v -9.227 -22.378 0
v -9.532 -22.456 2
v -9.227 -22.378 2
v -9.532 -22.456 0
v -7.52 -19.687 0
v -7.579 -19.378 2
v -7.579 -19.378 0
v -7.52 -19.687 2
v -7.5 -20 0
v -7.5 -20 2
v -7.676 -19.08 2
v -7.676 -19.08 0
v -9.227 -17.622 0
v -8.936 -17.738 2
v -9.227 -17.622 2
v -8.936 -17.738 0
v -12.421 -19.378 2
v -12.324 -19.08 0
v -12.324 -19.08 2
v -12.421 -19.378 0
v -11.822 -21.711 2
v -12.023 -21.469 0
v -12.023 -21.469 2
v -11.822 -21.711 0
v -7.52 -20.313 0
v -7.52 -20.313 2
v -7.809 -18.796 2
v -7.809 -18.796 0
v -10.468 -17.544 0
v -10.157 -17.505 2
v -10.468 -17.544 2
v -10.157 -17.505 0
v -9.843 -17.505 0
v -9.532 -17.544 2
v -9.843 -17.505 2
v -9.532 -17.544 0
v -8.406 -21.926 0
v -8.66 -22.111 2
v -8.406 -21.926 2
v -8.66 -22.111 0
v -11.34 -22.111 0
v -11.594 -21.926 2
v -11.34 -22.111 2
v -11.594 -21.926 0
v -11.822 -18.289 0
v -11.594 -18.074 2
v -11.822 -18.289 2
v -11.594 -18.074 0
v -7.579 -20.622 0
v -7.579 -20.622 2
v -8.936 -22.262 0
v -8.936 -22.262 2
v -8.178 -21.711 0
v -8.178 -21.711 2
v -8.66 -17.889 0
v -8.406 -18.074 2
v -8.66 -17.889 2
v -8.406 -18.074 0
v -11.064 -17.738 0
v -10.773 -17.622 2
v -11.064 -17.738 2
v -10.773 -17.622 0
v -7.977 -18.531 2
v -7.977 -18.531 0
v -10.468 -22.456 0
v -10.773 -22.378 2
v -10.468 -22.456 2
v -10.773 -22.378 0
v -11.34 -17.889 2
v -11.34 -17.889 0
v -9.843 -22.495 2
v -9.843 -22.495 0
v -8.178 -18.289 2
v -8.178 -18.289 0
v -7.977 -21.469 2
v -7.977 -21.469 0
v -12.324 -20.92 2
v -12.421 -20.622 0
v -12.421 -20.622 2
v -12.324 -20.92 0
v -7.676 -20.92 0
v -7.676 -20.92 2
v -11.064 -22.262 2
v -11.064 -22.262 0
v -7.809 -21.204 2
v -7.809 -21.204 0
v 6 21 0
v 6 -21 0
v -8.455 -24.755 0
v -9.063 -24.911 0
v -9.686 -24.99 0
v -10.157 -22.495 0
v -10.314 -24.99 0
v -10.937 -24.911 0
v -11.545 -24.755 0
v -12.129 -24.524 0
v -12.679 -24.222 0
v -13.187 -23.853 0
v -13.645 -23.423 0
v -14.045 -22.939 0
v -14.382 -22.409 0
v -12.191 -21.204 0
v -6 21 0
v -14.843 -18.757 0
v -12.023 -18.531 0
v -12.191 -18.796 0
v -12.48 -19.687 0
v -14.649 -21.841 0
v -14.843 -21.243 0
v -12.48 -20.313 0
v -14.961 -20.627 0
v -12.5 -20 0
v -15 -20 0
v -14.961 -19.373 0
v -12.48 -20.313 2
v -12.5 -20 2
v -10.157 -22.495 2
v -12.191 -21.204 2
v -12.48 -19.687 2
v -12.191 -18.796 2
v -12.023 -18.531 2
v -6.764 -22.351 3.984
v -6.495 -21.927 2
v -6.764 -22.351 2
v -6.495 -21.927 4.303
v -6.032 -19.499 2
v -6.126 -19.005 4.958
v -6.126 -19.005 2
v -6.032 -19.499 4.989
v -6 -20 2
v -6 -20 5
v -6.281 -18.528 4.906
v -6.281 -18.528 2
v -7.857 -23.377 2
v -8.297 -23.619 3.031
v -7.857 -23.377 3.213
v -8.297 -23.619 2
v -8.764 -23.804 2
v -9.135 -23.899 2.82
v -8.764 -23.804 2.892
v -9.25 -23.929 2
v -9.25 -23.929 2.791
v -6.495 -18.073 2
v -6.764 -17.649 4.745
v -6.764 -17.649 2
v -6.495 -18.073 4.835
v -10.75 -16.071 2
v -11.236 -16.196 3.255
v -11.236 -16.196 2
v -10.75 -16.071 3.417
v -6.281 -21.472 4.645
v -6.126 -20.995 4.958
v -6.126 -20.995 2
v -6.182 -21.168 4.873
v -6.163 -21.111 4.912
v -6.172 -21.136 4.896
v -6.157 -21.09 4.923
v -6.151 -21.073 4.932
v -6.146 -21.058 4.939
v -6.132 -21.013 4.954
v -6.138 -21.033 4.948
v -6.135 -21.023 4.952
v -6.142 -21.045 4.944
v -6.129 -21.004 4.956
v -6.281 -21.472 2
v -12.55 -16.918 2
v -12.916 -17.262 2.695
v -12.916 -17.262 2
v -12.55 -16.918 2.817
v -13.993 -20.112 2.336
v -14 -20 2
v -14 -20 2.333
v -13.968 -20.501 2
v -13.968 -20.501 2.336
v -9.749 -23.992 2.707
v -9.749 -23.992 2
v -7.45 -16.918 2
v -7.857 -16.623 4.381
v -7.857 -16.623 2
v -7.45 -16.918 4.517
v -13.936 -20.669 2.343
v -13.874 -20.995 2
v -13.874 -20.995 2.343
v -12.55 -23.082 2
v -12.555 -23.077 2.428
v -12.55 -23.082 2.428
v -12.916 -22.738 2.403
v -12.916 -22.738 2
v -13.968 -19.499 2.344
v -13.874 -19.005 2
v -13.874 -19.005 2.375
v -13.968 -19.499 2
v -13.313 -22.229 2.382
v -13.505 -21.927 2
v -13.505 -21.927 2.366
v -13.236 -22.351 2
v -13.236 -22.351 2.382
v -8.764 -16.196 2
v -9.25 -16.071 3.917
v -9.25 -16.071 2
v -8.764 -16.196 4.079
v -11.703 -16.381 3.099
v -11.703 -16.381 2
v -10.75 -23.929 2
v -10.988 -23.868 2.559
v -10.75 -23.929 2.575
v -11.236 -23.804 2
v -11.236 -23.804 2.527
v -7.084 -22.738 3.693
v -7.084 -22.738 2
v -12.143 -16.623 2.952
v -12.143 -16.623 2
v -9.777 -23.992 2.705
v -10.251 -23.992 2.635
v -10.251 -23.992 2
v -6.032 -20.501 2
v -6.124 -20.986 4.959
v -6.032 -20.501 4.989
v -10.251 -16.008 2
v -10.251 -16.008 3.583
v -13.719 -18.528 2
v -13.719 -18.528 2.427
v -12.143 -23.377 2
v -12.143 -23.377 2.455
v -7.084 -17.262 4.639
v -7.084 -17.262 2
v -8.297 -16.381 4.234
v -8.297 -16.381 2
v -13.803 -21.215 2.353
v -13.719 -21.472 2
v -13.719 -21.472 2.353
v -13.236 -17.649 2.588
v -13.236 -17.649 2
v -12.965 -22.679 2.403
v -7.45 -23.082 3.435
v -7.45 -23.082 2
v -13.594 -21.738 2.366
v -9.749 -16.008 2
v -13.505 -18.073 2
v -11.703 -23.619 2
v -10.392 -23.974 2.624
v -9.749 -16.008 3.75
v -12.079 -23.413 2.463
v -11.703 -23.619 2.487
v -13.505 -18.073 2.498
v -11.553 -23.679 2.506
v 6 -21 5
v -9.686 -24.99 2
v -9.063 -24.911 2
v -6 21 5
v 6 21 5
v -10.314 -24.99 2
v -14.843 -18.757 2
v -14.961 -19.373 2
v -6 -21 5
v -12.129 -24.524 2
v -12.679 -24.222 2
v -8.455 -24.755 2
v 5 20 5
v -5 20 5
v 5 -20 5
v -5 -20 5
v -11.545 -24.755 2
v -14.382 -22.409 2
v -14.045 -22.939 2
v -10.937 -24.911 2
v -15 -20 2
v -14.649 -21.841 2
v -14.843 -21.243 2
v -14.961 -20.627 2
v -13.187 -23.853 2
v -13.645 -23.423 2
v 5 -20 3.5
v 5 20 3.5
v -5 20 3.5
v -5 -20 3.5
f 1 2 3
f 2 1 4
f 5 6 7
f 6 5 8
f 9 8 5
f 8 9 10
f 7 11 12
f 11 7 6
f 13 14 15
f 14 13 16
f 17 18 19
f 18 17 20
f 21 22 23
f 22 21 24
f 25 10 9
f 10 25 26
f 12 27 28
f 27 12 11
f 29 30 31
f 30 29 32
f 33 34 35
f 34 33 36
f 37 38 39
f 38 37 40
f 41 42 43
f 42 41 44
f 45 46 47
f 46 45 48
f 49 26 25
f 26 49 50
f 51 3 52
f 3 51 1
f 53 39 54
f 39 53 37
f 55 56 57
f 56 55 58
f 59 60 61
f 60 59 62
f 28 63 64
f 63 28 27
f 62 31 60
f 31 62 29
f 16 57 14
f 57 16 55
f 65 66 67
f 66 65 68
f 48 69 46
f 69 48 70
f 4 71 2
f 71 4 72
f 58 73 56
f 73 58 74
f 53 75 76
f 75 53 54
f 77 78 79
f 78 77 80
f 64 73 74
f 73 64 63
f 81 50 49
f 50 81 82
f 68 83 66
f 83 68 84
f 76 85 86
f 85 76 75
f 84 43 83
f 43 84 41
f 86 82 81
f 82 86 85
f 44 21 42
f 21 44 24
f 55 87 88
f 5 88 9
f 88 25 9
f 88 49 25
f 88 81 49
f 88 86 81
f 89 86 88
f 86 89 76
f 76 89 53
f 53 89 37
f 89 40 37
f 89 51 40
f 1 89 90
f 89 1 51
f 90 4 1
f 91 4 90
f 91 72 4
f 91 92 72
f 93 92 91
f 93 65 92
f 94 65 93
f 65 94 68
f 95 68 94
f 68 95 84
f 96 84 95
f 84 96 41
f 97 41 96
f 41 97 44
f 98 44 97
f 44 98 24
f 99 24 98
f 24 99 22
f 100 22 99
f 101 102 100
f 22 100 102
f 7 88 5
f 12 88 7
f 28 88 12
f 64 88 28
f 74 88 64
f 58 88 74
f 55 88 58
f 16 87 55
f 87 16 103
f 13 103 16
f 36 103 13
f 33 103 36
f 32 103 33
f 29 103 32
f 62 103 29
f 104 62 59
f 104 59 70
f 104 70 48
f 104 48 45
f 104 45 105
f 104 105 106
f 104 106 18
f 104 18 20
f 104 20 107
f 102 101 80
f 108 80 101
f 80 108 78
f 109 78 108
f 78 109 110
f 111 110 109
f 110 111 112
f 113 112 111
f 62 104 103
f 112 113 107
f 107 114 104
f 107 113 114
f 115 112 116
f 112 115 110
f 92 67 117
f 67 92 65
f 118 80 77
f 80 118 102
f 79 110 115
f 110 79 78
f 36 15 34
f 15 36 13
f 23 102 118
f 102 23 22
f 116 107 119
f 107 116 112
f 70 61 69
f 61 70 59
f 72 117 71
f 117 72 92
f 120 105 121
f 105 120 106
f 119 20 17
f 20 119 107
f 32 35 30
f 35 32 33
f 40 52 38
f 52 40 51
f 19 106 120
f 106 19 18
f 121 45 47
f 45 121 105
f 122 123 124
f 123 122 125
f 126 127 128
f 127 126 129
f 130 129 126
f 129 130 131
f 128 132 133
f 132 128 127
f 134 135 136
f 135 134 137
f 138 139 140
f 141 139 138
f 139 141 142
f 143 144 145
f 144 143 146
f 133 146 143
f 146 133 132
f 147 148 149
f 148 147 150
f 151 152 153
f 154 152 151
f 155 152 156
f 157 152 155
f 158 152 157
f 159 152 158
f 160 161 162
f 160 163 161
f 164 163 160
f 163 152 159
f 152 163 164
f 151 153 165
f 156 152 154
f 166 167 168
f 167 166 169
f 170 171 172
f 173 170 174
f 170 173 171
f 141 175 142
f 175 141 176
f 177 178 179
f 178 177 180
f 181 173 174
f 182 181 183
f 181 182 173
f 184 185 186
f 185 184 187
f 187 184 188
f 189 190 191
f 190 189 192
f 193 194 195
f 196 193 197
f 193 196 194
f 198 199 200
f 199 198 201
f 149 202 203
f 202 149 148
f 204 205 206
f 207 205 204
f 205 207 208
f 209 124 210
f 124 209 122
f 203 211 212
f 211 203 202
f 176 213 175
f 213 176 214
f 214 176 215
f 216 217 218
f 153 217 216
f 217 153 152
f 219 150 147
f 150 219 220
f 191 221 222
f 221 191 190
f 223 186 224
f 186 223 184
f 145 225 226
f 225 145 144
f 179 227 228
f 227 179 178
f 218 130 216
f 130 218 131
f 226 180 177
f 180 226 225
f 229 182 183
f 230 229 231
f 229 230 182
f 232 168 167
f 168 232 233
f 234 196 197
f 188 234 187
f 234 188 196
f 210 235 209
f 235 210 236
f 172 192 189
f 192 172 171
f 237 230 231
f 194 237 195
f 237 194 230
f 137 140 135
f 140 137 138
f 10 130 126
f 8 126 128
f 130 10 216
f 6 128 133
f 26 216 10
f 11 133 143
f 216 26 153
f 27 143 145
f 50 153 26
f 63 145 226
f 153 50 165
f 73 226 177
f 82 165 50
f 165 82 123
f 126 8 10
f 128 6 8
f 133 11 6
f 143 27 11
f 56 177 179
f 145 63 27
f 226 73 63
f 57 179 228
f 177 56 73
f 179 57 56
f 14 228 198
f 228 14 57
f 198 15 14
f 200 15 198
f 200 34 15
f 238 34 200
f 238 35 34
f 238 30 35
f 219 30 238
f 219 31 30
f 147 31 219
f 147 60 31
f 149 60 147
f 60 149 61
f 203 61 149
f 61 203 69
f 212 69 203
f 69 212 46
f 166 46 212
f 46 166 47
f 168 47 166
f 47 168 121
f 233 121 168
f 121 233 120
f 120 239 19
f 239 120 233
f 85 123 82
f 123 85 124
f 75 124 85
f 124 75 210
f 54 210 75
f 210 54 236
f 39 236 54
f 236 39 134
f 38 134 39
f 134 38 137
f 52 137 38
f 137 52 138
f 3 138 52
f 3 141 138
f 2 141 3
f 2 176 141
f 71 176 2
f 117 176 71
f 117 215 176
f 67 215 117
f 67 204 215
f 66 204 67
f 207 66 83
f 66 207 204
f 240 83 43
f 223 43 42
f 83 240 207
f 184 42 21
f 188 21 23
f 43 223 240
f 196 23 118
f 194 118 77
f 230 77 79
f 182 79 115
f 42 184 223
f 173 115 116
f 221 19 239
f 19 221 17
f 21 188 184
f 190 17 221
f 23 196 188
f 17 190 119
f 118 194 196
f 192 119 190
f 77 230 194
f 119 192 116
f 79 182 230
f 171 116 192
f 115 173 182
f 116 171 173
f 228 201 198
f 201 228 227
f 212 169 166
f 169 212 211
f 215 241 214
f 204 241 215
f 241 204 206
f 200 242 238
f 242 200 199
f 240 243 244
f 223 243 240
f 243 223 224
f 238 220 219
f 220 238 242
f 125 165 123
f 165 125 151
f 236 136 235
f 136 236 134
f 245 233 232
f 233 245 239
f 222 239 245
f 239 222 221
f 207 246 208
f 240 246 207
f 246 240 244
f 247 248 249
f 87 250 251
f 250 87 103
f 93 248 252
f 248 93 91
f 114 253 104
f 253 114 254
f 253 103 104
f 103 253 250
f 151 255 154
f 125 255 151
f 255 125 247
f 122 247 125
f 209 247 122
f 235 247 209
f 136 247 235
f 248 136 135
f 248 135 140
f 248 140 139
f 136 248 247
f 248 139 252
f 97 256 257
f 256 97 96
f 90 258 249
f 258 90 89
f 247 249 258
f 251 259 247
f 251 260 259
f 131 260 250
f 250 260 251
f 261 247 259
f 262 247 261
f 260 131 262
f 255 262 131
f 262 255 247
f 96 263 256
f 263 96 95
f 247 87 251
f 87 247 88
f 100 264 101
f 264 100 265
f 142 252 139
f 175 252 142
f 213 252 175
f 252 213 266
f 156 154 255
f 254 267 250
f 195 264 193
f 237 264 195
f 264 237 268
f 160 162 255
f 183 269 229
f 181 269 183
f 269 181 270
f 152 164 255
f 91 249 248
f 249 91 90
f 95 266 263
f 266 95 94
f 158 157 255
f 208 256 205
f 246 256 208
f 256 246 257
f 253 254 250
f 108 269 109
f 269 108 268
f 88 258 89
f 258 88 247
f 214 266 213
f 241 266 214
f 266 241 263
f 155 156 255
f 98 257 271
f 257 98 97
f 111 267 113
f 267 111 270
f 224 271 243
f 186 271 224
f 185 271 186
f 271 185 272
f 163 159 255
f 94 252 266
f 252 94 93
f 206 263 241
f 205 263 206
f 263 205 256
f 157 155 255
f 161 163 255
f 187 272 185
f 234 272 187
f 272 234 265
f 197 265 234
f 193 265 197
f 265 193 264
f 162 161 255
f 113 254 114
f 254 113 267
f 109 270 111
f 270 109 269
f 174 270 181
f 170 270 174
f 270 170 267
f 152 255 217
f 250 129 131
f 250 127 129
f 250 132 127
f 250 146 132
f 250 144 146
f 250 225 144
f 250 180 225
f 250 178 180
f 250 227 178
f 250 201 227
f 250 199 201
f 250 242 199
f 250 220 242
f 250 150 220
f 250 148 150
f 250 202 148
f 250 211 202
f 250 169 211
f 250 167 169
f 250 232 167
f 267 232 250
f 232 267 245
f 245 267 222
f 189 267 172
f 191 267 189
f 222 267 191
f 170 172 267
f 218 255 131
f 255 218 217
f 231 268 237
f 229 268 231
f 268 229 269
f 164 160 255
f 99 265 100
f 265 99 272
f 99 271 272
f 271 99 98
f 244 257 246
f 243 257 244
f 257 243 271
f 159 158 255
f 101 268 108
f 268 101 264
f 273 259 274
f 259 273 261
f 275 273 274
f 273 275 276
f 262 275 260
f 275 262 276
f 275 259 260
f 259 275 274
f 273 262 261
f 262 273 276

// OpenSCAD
INSERT_WIDTH = 10;
INSERT_LENGTH = 40;
INSERT_DEPTH = 1.5;

WIDTH = INSERT_WIDTH + 2;
LENGTH = INSERT_LENGTH + 2;
HEIGHT = 5;

MOUNT_TAB_DIA = 10;
MOUNT_TAB_THICKNESS = 2;

HOLE_HEAD_DIA = 8;
HOLE_DIA = 5;
HOLE_OFFSET_X = -10;
HOLE_OFFSET_Y = -20;

$fn = 50;

difference() {
  union() {
    hull() {
      translate([HOLE_OFFSET_X, HOLE_OFFSET_Y, 0])
      cylinder(d = MOUNT_TAB_DIA, h = MOUNT_TAB_THICKNESS);

      translate([-WIDTH/2, -LENGTH/2, 0])
      cube([WIDTH, LENGTH, HEIGHT]);
    }
  }

  #translate([HOLE_OFFSET_X, HOLE_OFFSET_Y, 0]) {
    cylinder(d = HOLE_DIA, h = HEIGHT);
    translate([0, 0, MOUNT_TAB_THICKNESS])
    cylinder(d = HOLE_HEAD_DIA, h = HEIGHT);
  }

  #translate([-INSERT_WIDTH/2, -INSERT_LENGTH/2, HEIGHT - INSERT_DEPTH])
  cube([INSERT_WIDTH, INSERT_LENGTH, HEIGHT]);

}
